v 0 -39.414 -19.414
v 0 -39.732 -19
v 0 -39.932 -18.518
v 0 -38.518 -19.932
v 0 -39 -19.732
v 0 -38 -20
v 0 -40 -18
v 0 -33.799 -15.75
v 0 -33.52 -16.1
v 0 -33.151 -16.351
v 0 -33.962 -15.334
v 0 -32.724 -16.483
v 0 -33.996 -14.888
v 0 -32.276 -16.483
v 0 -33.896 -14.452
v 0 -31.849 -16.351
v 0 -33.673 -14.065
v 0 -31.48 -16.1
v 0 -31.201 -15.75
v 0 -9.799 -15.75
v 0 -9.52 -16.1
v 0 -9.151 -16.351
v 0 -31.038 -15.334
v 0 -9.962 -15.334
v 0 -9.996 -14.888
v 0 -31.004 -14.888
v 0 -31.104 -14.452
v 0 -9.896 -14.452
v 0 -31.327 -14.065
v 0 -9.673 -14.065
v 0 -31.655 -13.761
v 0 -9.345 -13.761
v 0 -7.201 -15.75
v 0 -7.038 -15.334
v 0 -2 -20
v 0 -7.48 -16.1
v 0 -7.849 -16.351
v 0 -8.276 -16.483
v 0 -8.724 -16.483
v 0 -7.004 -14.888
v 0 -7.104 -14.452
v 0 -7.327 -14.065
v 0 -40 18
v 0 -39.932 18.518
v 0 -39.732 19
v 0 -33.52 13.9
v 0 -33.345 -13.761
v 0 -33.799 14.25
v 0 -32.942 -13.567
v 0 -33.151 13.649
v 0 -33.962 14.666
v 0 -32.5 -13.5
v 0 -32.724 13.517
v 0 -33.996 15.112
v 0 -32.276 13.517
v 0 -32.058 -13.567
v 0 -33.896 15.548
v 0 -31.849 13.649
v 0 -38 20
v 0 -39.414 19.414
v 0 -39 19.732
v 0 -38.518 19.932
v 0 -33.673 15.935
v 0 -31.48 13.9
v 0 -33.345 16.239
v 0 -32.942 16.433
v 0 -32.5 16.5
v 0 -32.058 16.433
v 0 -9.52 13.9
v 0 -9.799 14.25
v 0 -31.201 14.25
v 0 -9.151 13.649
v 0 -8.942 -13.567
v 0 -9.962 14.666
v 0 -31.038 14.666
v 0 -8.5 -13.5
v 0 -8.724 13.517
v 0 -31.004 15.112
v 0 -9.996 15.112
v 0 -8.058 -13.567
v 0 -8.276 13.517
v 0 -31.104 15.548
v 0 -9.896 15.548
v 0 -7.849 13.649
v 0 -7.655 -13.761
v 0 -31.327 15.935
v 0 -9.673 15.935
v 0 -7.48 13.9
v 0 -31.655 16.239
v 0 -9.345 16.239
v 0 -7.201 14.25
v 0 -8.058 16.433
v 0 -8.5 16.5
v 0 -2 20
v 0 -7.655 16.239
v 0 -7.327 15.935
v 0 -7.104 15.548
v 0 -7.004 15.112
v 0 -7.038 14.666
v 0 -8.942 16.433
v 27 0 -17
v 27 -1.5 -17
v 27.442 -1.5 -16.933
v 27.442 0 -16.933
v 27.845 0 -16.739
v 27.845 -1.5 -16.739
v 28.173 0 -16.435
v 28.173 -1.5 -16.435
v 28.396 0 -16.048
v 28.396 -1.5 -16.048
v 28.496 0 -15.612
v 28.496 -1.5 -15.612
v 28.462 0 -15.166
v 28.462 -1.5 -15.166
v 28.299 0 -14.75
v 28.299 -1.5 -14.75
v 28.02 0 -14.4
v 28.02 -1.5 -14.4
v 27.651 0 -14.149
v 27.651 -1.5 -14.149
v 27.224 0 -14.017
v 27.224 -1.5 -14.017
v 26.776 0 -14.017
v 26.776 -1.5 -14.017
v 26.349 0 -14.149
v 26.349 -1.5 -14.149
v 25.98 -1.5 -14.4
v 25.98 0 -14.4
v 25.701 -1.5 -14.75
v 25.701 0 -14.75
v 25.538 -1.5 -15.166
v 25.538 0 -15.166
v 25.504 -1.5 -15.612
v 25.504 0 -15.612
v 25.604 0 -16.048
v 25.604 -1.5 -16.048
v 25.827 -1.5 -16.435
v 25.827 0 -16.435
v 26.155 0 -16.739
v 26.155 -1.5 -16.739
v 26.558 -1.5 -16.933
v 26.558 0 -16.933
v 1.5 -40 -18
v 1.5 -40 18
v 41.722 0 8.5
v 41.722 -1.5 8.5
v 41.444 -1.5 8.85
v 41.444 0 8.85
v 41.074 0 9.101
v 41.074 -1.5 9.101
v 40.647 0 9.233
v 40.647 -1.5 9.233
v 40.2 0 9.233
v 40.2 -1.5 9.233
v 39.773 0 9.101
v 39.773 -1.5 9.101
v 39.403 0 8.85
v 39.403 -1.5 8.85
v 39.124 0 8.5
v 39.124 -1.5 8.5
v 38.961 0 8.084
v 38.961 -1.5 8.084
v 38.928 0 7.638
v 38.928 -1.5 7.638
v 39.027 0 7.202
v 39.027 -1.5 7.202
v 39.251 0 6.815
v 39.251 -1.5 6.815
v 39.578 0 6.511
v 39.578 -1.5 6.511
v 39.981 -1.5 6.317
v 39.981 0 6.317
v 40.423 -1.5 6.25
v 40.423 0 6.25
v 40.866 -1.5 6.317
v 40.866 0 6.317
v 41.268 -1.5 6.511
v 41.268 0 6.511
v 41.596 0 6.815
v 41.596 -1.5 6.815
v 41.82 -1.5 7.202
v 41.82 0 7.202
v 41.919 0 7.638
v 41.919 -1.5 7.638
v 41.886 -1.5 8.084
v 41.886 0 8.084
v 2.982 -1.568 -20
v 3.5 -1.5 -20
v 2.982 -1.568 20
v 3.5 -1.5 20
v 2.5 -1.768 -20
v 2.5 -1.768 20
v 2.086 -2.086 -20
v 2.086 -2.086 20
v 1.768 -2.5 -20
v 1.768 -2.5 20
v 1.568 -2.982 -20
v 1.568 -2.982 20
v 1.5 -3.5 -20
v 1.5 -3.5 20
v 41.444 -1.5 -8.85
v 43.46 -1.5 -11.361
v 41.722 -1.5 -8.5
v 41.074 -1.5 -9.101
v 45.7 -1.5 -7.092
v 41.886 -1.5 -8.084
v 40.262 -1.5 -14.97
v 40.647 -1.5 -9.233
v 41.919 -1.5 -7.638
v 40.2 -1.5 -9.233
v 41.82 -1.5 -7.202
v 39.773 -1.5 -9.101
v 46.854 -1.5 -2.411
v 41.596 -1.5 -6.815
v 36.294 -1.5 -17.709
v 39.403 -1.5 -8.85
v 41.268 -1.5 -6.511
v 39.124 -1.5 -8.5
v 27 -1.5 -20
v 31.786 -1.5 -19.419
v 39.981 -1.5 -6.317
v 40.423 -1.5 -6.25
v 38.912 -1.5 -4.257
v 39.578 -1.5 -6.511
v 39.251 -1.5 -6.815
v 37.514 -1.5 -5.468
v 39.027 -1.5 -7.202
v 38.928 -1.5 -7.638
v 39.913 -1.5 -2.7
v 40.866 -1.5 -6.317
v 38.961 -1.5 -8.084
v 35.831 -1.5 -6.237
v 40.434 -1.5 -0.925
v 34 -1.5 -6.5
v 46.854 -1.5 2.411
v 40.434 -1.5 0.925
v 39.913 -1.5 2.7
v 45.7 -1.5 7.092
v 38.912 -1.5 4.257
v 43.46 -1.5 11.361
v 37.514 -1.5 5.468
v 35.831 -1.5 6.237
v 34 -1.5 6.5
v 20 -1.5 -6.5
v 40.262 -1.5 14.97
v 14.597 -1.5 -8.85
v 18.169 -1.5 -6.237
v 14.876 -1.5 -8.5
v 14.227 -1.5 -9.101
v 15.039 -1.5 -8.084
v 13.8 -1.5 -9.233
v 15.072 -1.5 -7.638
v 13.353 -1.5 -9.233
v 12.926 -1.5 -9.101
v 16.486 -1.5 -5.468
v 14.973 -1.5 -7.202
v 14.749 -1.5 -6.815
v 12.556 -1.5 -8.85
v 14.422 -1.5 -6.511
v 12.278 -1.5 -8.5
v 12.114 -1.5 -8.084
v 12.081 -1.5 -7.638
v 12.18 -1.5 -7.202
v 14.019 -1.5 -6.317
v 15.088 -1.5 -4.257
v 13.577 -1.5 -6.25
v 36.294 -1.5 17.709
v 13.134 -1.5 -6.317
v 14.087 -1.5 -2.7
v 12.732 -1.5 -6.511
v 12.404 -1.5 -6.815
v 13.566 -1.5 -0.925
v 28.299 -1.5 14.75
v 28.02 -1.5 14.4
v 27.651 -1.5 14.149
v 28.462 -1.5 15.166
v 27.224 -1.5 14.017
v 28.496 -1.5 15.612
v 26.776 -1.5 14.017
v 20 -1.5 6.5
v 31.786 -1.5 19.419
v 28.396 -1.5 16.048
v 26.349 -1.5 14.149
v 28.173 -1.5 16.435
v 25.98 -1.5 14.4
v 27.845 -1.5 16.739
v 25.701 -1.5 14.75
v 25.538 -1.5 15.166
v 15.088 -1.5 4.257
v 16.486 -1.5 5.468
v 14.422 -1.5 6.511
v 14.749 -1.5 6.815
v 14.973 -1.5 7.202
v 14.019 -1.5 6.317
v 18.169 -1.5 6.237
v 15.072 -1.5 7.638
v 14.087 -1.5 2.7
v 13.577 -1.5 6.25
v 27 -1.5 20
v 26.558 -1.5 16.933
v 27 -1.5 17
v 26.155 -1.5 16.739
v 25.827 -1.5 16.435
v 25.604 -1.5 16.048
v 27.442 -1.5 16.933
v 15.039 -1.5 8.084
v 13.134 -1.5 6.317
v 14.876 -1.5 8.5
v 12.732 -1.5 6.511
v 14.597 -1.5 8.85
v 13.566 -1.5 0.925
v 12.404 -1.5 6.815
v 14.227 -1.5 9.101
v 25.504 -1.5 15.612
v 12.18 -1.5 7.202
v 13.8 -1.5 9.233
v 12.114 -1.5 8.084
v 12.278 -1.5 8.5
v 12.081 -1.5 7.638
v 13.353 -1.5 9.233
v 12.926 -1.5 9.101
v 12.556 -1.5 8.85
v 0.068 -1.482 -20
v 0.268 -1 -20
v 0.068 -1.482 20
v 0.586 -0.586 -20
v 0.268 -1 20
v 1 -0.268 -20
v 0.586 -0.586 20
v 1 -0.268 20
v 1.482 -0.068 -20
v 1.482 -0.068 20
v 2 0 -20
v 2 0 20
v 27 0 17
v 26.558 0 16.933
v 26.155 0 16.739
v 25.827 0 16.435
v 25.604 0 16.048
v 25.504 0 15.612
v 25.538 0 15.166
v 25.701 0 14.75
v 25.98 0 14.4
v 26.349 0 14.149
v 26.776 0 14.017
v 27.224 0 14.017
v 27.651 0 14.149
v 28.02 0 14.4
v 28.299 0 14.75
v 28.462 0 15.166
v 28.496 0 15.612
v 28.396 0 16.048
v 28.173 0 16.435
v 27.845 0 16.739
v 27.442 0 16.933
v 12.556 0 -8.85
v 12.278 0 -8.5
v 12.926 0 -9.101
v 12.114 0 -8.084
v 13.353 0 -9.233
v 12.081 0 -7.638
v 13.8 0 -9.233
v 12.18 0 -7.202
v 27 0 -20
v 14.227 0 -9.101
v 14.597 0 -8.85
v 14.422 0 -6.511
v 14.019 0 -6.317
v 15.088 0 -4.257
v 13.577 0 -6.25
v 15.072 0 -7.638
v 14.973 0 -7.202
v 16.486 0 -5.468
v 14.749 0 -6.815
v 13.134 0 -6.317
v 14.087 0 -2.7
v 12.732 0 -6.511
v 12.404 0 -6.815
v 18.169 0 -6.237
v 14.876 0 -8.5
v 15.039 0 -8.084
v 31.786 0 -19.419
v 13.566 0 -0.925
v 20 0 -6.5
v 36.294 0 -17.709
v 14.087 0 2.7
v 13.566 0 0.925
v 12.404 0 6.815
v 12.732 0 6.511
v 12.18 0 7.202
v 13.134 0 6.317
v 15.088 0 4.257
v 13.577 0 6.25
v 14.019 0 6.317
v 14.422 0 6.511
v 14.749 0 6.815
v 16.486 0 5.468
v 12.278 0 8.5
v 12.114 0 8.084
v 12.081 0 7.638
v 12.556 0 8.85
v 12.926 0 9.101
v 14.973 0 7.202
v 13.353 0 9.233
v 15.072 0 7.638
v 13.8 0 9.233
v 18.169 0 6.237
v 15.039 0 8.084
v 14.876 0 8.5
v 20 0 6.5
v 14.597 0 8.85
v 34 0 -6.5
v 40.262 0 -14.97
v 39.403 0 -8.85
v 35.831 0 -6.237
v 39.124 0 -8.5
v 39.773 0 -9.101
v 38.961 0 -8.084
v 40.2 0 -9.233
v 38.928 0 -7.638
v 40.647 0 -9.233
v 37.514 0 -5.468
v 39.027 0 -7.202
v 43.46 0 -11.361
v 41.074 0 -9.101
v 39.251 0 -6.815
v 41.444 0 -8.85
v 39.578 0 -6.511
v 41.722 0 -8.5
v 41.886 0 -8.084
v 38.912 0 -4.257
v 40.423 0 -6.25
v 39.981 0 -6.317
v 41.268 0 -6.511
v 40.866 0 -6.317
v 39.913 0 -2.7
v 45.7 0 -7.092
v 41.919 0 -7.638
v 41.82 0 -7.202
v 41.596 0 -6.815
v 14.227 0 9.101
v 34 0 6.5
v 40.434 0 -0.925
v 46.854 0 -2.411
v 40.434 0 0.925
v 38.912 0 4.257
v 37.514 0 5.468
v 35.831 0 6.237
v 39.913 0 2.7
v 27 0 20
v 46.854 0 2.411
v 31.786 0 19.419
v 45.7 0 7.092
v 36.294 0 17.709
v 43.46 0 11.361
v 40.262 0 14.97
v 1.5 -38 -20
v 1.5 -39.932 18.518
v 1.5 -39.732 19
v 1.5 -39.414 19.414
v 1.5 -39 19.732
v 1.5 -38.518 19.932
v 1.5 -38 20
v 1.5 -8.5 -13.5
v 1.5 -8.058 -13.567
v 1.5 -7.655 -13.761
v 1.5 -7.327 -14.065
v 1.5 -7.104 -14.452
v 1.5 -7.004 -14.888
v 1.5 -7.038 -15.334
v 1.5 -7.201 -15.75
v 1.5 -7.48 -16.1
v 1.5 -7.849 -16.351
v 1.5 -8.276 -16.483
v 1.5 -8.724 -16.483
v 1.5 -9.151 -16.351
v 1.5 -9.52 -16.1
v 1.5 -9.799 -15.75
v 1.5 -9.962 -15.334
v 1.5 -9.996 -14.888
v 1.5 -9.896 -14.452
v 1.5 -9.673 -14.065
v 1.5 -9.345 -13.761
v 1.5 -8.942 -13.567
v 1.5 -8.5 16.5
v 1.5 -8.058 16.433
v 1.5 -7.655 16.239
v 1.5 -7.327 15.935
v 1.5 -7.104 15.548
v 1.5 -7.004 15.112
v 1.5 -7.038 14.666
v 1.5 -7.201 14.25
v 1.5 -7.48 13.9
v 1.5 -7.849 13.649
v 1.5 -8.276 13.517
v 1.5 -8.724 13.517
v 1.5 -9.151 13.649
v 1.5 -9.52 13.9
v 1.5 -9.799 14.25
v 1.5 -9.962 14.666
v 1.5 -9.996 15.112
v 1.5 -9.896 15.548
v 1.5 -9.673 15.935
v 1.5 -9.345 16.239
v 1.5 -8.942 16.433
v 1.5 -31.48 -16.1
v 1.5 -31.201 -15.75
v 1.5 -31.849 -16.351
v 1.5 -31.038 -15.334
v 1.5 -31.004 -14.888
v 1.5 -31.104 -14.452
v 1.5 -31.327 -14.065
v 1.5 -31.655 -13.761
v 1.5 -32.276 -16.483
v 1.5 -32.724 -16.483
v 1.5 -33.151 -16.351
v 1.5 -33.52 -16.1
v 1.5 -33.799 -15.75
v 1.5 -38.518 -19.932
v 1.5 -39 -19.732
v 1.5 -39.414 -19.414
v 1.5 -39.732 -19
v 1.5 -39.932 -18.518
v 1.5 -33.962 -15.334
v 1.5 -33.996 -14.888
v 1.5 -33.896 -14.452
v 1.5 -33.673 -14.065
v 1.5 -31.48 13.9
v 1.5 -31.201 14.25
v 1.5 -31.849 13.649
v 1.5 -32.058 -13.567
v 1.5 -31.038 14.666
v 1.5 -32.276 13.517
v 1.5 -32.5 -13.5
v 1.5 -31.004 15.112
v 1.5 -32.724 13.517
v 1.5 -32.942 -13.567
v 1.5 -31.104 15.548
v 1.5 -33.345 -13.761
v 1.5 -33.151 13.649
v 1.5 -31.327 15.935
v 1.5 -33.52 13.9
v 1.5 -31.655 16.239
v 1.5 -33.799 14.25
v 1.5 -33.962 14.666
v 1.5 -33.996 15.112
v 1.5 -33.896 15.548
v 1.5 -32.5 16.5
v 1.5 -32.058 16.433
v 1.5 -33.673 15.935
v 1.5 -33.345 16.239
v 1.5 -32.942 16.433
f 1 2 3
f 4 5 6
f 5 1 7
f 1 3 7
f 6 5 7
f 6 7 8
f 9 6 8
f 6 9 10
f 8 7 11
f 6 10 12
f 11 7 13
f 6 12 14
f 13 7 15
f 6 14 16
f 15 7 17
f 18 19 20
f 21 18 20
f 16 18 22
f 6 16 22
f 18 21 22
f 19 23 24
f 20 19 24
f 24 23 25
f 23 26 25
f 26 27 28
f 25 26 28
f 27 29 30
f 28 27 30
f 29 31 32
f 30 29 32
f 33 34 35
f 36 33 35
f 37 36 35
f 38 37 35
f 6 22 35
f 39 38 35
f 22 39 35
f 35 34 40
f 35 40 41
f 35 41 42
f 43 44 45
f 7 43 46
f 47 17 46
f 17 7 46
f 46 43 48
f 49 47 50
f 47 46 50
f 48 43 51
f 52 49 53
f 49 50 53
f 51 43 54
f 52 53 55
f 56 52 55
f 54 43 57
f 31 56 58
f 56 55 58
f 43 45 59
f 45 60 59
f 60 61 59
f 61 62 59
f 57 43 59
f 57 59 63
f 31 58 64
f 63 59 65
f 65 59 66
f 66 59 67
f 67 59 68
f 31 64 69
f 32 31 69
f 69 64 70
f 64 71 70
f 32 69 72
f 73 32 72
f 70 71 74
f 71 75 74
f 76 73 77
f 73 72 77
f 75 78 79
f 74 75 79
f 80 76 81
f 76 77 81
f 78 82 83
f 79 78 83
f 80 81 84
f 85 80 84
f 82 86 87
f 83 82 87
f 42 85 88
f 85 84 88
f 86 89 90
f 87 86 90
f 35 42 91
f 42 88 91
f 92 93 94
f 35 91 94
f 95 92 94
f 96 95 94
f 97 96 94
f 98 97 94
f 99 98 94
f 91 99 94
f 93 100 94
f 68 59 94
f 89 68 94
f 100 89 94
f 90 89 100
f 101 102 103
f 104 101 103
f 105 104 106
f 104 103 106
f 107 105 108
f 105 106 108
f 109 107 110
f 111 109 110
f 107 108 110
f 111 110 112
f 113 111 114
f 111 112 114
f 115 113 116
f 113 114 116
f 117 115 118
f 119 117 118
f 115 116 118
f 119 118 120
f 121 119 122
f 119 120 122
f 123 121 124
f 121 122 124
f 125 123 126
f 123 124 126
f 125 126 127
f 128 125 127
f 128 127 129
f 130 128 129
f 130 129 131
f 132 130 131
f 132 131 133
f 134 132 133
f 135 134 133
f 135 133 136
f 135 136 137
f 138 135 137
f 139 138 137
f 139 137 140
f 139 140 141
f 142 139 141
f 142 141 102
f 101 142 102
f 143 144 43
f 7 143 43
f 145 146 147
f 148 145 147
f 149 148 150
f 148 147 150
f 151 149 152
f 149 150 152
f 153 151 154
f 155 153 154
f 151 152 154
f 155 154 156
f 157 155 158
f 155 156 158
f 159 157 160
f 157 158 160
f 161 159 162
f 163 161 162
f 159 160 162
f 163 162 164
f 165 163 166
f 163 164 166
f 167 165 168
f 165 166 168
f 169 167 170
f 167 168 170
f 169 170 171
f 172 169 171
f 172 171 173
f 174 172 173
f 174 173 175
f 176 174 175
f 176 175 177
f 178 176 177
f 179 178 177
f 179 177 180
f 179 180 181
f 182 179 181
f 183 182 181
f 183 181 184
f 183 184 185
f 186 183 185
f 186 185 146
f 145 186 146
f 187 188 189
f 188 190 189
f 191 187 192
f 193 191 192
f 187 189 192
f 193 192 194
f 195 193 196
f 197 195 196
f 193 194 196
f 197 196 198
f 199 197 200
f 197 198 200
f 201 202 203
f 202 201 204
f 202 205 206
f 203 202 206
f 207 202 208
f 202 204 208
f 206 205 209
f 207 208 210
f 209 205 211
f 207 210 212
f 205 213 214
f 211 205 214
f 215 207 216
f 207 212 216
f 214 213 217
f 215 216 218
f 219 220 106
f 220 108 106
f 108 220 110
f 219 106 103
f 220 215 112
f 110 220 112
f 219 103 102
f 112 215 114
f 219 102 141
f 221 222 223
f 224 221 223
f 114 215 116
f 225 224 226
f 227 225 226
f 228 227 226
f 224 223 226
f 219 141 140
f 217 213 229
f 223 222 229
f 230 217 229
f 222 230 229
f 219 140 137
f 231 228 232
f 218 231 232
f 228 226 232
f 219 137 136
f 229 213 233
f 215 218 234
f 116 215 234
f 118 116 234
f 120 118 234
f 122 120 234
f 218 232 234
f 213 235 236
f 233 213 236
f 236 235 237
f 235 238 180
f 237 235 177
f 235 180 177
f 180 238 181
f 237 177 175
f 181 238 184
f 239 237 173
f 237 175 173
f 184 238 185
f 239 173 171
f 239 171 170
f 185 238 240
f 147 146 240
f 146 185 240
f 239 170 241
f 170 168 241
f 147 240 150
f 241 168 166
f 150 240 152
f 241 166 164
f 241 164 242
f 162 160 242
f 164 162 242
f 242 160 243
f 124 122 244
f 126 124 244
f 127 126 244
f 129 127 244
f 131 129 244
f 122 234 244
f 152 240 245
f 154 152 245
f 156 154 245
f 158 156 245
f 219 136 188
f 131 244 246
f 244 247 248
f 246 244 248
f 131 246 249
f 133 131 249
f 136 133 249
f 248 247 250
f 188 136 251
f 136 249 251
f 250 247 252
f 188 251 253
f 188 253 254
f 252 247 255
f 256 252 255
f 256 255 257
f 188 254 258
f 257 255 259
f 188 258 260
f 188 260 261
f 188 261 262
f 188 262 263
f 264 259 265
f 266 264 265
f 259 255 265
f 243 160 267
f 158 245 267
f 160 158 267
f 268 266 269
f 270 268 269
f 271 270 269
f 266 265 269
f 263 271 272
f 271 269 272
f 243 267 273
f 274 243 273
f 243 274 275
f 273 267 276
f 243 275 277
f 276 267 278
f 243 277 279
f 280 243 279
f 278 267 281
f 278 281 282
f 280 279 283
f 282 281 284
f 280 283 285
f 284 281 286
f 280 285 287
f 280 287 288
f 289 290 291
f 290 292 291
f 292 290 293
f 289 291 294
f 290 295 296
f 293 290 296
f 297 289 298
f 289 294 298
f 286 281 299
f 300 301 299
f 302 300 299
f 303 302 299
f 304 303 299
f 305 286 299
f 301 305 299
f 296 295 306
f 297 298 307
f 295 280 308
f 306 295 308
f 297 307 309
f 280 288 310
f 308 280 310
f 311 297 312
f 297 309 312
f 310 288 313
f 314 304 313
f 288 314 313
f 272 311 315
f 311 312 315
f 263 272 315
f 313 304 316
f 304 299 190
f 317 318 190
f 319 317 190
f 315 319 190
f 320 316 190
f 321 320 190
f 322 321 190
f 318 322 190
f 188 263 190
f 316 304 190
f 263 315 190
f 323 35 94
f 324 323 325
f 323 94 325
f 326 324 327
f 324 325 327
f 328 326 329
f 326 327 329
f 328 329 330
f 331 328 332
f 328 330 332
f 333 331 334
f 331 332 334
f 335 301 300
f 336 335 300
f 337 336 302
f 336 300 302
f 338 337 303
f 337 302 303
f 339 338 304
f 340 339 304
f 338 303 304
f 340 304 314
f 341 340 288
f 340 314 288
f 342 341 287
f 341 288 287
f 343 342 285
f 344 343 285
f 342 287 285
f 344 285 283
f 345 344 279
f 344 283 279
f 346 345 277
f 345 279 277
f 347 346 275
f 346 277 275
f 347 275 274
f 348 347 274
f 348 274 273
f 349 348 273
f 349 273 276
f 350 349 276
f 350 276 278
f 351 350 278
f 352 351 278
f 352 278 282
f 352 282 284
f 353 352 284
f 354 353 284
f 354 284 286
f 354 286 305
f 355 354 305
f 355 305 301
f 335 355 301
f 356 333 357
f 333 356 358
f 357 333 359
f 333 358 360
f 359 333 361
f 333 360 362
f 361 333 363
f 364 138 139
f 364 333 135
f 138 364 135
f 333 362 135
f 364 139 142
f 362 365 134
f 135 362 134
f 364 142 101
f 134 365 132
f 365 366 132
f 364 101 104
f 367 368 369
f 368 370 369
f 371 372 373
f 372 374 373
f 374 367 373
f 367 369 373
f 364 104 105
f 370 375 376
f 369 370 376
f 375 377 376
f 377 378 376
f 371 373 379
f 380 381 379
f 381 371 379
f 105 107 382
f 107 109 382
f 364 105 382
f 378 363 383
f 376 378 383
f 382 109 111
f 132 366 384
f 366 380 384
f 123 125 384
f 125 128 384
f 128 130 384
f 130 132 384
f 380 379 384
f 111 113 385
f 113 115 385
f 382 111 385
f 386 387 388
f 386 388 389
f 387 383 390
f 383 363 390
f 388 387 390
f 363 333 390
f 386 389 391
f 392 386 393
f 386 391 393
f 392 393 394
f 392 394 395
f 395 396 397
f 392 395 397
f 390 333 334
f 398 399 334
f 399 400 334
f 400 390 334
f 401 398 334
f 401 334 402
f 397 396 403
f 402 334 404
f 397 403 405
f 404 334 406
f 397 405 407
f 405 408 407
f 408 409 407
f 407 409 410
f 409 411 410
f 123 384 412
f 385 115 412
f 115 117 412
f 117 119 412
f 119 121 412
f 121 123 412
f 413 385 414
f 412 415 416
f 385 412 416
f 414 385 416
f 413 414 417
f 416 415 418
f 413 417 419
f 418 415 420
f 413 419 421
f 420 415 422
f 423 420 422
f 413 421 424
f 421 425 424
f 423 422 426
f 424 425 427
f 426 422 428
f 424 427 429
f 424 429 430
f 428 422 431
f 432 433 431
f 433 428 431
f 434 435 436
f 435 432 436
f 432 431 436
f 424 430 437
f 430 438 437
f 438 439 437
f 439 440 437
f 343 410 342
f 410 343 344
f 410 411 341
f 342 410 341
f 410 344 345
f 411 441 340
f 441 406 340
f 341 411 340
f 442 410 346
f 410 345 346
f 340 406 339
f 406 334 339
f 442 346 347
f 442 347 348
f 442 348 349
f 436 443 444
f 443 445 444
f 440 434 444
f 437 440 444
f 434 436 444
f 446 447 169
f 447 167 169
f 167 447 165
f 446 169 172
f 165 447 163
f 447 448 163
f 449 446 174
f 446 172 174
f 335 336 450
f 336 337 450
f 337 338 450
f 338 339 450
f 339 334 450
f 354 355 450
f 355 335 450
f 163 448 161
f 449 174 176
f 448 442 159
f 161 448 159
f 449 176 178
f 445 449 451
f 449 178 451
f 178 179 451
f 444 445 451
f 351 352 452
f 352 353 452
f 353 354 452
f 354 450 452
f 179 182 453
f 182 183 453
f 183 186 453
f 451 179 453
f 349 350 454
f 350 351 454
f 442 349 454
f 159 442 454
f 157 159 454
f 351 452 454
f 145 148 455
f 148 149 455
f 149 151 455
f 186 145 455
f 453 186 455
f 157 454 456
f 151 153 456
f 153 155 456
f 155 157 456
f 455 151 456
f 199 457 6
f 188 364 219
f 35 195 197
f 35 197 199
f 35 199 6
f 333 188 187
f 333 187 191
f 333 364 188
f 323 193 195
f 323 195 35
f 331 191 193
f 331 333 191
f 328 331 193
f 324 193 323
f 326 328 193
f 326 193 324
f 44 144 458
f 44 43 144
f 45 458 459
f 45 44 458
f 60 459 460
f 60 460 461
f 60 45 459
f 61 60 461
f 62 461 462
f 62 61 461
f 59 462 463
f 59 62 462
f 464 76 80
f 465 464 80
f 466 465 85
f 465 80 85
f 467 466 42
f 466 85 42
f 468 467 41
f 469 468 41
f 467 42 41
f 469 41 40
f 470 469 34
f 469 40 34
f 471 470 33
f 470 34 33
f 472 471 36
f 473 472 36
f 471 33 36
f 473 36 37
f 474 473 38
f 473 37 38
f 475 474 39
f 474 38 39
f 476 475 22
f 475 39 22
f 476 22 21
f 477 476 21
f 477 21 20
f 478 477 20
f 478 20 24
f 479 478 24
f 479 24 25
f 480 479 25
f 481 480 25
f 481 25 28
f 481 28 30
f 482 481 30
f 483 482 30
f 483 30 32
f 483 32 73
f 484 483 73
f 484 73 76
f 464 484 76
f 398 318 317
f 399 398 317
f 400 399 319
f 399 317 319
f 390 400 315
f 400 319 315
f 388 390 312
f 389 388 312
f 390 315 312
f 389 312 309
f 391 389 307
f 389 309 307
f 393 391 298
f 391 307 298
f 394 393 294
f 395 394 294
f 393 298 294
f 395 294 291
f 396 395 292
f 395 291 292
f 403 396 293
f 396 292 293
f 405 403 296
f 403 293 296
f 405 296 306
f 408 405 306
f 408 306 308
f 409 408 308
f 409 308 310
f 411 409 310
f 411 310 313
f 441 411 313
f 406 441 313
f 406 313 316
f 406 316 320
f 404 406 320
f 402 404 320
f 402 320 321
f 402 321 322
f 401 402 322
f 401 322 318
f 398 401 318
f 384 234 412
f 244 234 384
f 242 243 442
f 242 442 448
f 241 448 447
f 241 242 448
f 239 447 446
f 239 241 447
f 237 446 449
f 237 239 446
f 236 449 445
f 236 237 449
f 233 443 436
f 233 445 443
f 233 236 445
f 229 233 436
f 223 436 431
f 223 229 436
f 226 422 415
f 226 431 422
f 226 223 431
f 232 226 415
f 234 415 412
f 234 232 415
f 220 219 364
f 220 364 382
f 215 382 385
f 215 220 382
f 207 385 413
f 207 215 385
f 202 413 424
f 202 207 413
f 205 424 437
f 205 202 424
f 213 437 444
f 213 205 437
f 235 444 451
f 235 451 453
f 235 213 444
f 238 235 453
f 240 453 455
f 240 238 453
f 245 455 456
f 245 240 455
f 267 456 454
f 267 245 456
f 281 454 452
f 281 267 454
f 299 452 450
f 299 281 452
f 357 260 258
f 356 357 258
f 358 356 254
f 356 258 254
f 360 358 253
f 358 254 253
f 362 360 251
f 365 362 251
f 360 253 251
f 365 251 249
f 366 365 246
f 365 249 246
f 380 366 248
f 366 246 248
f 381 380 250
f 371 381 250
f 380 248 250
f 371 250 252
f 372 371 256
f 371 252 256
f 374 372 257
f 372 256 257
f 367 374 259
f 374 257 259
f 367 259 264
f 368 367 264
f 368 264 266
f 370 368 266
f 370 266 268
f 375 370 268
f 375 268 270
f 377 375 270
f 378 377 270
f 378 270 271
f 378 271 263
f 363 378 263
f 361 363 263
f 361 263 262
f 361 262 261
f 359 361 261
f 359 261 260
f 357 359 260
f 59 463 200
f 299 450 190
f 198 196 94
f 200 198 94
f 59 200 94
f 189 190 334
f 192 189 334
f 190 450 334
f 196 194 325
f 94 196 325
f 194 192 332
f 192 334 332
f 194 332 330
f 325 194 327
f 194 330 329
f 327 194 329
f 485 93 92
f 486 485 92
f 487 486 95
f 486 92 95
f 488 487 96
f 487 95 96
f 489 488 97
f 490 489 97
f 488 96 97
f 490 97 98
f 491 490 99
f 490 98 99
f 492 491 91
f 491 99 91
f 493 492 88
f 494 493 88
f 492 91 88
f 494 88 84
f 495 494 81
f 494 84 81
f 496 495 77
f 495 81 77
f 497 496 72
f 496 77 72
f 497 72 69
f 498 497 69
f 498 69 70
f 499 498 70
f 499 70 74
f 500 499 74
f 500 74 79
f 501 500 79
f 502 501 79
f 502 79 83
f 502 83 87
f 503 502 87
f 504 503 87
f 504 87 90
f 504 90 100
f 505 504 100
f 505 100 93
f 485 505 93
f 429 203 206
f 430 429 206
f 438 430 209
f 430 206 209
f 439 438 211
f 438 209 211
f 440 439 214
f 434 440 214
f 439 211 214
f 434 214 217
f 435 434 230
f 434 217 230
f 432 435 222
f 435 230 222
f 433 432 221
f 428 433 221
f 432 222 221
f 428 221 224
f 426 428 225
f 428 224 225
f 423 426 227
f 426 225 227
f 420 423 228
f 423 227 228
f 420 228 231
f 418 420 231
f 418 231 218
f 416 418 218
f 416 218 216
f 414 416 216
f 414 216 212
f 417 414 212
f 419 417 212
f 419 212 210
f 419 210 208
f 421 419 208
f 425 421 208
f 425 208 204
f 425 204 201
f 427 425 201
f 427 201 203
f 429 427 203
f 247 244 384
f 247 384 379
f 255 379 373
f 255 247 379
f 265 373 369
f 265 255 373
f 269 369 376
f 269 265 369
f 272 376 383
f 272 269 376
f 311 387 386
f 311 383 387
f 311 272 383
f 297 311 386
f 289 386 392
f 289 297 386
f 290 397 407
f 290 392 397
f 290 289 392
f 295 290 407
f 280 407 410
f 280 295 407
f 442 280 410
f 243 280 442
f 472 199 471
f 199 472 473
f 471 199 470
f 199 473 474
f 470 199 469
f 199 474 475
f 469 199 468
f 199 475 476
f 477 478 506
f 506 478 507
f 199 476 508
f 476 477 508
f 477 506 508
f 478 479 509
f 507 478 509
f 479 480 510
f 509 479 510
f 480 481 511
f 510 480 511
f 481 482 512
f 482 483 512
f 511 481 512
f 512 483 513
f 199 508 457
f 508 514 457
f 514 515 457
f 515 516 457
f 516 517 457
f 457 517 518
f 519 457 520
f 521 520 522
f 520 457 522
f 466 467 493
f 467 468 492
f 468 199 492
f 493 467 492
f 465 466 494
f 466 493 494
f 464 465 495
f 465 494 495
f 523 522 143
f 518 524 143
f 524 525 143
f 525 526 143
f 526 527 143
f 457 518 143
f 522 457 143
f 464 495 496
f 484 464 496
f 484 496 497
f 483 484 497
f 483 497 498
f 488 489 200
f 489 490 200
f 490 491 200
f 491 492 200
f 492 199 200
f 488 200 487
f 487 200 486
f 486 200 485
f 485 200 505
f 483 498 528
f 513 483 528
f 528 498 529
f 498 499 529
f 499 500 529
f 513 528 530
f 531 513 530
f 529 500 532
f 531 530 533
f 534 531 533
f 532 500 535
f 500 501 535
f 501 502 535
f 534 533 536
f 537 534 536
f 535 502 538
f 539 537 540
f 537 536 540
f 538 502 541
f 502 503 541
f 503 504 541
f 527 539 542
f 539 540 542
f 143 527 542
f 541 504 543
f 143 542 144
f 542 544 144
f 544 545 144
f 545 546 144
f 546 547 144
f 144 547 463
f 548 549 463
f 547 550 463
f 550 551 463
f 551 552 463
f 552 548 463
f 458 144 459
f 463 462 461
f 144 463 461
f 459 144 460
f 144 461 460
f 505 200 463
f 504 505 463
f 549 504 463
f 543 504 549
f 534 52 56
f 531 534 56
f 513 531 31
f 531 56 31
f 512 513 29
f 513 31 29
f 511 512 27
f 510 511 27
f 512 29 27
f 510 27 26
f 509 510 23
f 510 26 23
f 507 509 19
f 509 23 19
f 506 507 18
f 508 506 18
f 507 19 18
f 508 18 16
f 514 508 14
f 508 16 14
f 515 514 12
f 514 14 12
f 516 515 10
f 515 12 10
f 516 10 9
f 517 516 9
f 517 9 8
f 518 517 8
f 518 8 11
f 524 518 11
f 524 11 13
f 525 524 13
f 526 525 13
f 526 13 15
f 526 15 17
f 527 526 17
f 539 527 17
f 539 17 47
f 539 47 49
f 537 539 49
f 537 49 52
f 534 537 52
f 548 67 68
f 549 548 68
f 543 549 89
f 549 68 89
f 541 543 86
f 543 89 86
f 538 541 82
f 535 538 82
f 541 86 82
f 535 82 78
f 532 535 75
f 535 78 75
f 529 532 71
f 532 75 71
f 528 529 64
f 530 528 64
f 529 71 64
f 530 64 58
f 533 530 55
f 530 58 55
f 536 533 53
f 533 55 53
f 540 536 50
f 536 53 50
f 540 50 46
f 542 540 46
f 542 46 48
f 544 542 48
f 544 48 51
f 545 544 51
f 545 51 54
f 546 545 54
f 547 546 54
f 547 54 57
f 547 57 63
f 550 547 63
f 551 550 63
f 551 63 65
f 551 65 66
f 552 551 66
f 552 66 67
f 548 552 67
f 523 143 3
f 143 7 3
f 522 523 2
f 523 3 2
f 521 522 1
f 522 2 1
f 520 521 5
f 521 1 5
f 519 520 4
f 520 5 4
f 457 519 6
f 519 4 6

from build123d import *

# Parameters (mm, degrees)
EXTRUDE_1_DEPTH          = 20
CUT_EXTRUDE_2_DEPTH      = 40
SKETCH_4_R               = 1.5
CUT_EXTRUDE_3_DEPTH      = 40
SKETCH_5_R               = 1.5
CUT_EXTRUDE_4_DEPTH      = 40
FILLET_1_R               = 2
PATTERN_CIRCULAR_1_COUNT = 6


with BuildPart() as part:
    # 草图1 → 凸台-拉伸1 (new, symmetric)
    with BuildSketch(Plane.XY):
        with BuildLine():
            Line((0, -40), (0, -2))
            ThreePointArc((0, -2), (0.585786438, -0.585786438), (2, 0))
            Line((2, 0), (50, 0))
            Line((50, 0), (50, -1.5))
            Line((50, -1.5), (3.5, -1.5))
            ThreePointArc((3.5, -1.5), (2.085786438, -2.085786438), (1.5, -3.5))
            Line((1.5, -3.5), (1.5, -40))
            Line((1.5, -40), (0, -40))
        make_face()
    extrude(amount=EXTRUDE_1_DEPTH, both=True)

    # 草图3 → 切除-拉伸2 (cut)
    with BuildSketch(Plane.XZ.offset(1.5)):
        with BuildLine():
            Line((27, 20), (50, 20))
            Line((50, 20), (50, -20))
            Line((50, -20), (27, -20))
            ThreePointArc((27, -20), (47, 0), (27, 20))
        make_face()
        with BuildLine():
            Line((34, -6.5), (20, -6.5))
            ThreePointArc((20, -6.5), (13.5, 0), (20, 6.5))
            Line((20, 6.5), (34, 6.5))
            ThreePointArc((34, 6.5), (40.5, 0), (34, -6.5))
        make_face()
    extrude(amount=-CUT_EXTRUDE_2_DEPTH, mode=Mode.SUBTRACT)

    # 草图4 → 切除-拉伸3 (cut)
    with BuildSketch(Plane.XZ.offset(1.5)):
        with Locations(Location((27, -15.5, 0), (0, 0, 270))):
            Circle(SKETCH_4_R)
    cut_extrude_3 = extrude(amount=-CUT_EXTRUDE_3_DEPTH, mode=Mode.SUBTRACT)

    # 草图5 → 切除-拉伸4 (cut)
    with BuildSketch(Plane.ZY):
        with Locations((15, -8.5)):
            Circle(SKETCH_5_R)
        with Locations((15, -32.5)):
            Circle(SKETCH_5_R)
        with Locations((-15, -32.5)):
            Circle(SKETCH_5_R)
        with Locations((-15, -8.5)):
            Circle(SKETCH_5_R)
    extrude(amount=-CUT_EXTRUDE_4_DEPTH, mode=Mode.SUBTRACT)

    # 圆角1
    fillet_1_edges = [part.edges().sort_by_distance(p)[0] for p in [
        (0.75, -40, 20),
        (0.75, -40, -20),
    ]]
    fillet(fillet_1_edges, radius=FILLET_1_R)

    # 阵列(圆周)1: 切除-拉伸3 ×6 about axis
    pattern_circular_1_axis = Axis((27, 0, 0), (0, 1, 0))
    for i in range(1, PATTERN_CIRCULAR_1_COUNT):
        add(cut_extrude_3.rotate(pattern_circular_1_axis, i * 360 / PATTERN_CIRCULAR_1_COUNT), mode=Mode.SUBTRACT)


solid = part.part
